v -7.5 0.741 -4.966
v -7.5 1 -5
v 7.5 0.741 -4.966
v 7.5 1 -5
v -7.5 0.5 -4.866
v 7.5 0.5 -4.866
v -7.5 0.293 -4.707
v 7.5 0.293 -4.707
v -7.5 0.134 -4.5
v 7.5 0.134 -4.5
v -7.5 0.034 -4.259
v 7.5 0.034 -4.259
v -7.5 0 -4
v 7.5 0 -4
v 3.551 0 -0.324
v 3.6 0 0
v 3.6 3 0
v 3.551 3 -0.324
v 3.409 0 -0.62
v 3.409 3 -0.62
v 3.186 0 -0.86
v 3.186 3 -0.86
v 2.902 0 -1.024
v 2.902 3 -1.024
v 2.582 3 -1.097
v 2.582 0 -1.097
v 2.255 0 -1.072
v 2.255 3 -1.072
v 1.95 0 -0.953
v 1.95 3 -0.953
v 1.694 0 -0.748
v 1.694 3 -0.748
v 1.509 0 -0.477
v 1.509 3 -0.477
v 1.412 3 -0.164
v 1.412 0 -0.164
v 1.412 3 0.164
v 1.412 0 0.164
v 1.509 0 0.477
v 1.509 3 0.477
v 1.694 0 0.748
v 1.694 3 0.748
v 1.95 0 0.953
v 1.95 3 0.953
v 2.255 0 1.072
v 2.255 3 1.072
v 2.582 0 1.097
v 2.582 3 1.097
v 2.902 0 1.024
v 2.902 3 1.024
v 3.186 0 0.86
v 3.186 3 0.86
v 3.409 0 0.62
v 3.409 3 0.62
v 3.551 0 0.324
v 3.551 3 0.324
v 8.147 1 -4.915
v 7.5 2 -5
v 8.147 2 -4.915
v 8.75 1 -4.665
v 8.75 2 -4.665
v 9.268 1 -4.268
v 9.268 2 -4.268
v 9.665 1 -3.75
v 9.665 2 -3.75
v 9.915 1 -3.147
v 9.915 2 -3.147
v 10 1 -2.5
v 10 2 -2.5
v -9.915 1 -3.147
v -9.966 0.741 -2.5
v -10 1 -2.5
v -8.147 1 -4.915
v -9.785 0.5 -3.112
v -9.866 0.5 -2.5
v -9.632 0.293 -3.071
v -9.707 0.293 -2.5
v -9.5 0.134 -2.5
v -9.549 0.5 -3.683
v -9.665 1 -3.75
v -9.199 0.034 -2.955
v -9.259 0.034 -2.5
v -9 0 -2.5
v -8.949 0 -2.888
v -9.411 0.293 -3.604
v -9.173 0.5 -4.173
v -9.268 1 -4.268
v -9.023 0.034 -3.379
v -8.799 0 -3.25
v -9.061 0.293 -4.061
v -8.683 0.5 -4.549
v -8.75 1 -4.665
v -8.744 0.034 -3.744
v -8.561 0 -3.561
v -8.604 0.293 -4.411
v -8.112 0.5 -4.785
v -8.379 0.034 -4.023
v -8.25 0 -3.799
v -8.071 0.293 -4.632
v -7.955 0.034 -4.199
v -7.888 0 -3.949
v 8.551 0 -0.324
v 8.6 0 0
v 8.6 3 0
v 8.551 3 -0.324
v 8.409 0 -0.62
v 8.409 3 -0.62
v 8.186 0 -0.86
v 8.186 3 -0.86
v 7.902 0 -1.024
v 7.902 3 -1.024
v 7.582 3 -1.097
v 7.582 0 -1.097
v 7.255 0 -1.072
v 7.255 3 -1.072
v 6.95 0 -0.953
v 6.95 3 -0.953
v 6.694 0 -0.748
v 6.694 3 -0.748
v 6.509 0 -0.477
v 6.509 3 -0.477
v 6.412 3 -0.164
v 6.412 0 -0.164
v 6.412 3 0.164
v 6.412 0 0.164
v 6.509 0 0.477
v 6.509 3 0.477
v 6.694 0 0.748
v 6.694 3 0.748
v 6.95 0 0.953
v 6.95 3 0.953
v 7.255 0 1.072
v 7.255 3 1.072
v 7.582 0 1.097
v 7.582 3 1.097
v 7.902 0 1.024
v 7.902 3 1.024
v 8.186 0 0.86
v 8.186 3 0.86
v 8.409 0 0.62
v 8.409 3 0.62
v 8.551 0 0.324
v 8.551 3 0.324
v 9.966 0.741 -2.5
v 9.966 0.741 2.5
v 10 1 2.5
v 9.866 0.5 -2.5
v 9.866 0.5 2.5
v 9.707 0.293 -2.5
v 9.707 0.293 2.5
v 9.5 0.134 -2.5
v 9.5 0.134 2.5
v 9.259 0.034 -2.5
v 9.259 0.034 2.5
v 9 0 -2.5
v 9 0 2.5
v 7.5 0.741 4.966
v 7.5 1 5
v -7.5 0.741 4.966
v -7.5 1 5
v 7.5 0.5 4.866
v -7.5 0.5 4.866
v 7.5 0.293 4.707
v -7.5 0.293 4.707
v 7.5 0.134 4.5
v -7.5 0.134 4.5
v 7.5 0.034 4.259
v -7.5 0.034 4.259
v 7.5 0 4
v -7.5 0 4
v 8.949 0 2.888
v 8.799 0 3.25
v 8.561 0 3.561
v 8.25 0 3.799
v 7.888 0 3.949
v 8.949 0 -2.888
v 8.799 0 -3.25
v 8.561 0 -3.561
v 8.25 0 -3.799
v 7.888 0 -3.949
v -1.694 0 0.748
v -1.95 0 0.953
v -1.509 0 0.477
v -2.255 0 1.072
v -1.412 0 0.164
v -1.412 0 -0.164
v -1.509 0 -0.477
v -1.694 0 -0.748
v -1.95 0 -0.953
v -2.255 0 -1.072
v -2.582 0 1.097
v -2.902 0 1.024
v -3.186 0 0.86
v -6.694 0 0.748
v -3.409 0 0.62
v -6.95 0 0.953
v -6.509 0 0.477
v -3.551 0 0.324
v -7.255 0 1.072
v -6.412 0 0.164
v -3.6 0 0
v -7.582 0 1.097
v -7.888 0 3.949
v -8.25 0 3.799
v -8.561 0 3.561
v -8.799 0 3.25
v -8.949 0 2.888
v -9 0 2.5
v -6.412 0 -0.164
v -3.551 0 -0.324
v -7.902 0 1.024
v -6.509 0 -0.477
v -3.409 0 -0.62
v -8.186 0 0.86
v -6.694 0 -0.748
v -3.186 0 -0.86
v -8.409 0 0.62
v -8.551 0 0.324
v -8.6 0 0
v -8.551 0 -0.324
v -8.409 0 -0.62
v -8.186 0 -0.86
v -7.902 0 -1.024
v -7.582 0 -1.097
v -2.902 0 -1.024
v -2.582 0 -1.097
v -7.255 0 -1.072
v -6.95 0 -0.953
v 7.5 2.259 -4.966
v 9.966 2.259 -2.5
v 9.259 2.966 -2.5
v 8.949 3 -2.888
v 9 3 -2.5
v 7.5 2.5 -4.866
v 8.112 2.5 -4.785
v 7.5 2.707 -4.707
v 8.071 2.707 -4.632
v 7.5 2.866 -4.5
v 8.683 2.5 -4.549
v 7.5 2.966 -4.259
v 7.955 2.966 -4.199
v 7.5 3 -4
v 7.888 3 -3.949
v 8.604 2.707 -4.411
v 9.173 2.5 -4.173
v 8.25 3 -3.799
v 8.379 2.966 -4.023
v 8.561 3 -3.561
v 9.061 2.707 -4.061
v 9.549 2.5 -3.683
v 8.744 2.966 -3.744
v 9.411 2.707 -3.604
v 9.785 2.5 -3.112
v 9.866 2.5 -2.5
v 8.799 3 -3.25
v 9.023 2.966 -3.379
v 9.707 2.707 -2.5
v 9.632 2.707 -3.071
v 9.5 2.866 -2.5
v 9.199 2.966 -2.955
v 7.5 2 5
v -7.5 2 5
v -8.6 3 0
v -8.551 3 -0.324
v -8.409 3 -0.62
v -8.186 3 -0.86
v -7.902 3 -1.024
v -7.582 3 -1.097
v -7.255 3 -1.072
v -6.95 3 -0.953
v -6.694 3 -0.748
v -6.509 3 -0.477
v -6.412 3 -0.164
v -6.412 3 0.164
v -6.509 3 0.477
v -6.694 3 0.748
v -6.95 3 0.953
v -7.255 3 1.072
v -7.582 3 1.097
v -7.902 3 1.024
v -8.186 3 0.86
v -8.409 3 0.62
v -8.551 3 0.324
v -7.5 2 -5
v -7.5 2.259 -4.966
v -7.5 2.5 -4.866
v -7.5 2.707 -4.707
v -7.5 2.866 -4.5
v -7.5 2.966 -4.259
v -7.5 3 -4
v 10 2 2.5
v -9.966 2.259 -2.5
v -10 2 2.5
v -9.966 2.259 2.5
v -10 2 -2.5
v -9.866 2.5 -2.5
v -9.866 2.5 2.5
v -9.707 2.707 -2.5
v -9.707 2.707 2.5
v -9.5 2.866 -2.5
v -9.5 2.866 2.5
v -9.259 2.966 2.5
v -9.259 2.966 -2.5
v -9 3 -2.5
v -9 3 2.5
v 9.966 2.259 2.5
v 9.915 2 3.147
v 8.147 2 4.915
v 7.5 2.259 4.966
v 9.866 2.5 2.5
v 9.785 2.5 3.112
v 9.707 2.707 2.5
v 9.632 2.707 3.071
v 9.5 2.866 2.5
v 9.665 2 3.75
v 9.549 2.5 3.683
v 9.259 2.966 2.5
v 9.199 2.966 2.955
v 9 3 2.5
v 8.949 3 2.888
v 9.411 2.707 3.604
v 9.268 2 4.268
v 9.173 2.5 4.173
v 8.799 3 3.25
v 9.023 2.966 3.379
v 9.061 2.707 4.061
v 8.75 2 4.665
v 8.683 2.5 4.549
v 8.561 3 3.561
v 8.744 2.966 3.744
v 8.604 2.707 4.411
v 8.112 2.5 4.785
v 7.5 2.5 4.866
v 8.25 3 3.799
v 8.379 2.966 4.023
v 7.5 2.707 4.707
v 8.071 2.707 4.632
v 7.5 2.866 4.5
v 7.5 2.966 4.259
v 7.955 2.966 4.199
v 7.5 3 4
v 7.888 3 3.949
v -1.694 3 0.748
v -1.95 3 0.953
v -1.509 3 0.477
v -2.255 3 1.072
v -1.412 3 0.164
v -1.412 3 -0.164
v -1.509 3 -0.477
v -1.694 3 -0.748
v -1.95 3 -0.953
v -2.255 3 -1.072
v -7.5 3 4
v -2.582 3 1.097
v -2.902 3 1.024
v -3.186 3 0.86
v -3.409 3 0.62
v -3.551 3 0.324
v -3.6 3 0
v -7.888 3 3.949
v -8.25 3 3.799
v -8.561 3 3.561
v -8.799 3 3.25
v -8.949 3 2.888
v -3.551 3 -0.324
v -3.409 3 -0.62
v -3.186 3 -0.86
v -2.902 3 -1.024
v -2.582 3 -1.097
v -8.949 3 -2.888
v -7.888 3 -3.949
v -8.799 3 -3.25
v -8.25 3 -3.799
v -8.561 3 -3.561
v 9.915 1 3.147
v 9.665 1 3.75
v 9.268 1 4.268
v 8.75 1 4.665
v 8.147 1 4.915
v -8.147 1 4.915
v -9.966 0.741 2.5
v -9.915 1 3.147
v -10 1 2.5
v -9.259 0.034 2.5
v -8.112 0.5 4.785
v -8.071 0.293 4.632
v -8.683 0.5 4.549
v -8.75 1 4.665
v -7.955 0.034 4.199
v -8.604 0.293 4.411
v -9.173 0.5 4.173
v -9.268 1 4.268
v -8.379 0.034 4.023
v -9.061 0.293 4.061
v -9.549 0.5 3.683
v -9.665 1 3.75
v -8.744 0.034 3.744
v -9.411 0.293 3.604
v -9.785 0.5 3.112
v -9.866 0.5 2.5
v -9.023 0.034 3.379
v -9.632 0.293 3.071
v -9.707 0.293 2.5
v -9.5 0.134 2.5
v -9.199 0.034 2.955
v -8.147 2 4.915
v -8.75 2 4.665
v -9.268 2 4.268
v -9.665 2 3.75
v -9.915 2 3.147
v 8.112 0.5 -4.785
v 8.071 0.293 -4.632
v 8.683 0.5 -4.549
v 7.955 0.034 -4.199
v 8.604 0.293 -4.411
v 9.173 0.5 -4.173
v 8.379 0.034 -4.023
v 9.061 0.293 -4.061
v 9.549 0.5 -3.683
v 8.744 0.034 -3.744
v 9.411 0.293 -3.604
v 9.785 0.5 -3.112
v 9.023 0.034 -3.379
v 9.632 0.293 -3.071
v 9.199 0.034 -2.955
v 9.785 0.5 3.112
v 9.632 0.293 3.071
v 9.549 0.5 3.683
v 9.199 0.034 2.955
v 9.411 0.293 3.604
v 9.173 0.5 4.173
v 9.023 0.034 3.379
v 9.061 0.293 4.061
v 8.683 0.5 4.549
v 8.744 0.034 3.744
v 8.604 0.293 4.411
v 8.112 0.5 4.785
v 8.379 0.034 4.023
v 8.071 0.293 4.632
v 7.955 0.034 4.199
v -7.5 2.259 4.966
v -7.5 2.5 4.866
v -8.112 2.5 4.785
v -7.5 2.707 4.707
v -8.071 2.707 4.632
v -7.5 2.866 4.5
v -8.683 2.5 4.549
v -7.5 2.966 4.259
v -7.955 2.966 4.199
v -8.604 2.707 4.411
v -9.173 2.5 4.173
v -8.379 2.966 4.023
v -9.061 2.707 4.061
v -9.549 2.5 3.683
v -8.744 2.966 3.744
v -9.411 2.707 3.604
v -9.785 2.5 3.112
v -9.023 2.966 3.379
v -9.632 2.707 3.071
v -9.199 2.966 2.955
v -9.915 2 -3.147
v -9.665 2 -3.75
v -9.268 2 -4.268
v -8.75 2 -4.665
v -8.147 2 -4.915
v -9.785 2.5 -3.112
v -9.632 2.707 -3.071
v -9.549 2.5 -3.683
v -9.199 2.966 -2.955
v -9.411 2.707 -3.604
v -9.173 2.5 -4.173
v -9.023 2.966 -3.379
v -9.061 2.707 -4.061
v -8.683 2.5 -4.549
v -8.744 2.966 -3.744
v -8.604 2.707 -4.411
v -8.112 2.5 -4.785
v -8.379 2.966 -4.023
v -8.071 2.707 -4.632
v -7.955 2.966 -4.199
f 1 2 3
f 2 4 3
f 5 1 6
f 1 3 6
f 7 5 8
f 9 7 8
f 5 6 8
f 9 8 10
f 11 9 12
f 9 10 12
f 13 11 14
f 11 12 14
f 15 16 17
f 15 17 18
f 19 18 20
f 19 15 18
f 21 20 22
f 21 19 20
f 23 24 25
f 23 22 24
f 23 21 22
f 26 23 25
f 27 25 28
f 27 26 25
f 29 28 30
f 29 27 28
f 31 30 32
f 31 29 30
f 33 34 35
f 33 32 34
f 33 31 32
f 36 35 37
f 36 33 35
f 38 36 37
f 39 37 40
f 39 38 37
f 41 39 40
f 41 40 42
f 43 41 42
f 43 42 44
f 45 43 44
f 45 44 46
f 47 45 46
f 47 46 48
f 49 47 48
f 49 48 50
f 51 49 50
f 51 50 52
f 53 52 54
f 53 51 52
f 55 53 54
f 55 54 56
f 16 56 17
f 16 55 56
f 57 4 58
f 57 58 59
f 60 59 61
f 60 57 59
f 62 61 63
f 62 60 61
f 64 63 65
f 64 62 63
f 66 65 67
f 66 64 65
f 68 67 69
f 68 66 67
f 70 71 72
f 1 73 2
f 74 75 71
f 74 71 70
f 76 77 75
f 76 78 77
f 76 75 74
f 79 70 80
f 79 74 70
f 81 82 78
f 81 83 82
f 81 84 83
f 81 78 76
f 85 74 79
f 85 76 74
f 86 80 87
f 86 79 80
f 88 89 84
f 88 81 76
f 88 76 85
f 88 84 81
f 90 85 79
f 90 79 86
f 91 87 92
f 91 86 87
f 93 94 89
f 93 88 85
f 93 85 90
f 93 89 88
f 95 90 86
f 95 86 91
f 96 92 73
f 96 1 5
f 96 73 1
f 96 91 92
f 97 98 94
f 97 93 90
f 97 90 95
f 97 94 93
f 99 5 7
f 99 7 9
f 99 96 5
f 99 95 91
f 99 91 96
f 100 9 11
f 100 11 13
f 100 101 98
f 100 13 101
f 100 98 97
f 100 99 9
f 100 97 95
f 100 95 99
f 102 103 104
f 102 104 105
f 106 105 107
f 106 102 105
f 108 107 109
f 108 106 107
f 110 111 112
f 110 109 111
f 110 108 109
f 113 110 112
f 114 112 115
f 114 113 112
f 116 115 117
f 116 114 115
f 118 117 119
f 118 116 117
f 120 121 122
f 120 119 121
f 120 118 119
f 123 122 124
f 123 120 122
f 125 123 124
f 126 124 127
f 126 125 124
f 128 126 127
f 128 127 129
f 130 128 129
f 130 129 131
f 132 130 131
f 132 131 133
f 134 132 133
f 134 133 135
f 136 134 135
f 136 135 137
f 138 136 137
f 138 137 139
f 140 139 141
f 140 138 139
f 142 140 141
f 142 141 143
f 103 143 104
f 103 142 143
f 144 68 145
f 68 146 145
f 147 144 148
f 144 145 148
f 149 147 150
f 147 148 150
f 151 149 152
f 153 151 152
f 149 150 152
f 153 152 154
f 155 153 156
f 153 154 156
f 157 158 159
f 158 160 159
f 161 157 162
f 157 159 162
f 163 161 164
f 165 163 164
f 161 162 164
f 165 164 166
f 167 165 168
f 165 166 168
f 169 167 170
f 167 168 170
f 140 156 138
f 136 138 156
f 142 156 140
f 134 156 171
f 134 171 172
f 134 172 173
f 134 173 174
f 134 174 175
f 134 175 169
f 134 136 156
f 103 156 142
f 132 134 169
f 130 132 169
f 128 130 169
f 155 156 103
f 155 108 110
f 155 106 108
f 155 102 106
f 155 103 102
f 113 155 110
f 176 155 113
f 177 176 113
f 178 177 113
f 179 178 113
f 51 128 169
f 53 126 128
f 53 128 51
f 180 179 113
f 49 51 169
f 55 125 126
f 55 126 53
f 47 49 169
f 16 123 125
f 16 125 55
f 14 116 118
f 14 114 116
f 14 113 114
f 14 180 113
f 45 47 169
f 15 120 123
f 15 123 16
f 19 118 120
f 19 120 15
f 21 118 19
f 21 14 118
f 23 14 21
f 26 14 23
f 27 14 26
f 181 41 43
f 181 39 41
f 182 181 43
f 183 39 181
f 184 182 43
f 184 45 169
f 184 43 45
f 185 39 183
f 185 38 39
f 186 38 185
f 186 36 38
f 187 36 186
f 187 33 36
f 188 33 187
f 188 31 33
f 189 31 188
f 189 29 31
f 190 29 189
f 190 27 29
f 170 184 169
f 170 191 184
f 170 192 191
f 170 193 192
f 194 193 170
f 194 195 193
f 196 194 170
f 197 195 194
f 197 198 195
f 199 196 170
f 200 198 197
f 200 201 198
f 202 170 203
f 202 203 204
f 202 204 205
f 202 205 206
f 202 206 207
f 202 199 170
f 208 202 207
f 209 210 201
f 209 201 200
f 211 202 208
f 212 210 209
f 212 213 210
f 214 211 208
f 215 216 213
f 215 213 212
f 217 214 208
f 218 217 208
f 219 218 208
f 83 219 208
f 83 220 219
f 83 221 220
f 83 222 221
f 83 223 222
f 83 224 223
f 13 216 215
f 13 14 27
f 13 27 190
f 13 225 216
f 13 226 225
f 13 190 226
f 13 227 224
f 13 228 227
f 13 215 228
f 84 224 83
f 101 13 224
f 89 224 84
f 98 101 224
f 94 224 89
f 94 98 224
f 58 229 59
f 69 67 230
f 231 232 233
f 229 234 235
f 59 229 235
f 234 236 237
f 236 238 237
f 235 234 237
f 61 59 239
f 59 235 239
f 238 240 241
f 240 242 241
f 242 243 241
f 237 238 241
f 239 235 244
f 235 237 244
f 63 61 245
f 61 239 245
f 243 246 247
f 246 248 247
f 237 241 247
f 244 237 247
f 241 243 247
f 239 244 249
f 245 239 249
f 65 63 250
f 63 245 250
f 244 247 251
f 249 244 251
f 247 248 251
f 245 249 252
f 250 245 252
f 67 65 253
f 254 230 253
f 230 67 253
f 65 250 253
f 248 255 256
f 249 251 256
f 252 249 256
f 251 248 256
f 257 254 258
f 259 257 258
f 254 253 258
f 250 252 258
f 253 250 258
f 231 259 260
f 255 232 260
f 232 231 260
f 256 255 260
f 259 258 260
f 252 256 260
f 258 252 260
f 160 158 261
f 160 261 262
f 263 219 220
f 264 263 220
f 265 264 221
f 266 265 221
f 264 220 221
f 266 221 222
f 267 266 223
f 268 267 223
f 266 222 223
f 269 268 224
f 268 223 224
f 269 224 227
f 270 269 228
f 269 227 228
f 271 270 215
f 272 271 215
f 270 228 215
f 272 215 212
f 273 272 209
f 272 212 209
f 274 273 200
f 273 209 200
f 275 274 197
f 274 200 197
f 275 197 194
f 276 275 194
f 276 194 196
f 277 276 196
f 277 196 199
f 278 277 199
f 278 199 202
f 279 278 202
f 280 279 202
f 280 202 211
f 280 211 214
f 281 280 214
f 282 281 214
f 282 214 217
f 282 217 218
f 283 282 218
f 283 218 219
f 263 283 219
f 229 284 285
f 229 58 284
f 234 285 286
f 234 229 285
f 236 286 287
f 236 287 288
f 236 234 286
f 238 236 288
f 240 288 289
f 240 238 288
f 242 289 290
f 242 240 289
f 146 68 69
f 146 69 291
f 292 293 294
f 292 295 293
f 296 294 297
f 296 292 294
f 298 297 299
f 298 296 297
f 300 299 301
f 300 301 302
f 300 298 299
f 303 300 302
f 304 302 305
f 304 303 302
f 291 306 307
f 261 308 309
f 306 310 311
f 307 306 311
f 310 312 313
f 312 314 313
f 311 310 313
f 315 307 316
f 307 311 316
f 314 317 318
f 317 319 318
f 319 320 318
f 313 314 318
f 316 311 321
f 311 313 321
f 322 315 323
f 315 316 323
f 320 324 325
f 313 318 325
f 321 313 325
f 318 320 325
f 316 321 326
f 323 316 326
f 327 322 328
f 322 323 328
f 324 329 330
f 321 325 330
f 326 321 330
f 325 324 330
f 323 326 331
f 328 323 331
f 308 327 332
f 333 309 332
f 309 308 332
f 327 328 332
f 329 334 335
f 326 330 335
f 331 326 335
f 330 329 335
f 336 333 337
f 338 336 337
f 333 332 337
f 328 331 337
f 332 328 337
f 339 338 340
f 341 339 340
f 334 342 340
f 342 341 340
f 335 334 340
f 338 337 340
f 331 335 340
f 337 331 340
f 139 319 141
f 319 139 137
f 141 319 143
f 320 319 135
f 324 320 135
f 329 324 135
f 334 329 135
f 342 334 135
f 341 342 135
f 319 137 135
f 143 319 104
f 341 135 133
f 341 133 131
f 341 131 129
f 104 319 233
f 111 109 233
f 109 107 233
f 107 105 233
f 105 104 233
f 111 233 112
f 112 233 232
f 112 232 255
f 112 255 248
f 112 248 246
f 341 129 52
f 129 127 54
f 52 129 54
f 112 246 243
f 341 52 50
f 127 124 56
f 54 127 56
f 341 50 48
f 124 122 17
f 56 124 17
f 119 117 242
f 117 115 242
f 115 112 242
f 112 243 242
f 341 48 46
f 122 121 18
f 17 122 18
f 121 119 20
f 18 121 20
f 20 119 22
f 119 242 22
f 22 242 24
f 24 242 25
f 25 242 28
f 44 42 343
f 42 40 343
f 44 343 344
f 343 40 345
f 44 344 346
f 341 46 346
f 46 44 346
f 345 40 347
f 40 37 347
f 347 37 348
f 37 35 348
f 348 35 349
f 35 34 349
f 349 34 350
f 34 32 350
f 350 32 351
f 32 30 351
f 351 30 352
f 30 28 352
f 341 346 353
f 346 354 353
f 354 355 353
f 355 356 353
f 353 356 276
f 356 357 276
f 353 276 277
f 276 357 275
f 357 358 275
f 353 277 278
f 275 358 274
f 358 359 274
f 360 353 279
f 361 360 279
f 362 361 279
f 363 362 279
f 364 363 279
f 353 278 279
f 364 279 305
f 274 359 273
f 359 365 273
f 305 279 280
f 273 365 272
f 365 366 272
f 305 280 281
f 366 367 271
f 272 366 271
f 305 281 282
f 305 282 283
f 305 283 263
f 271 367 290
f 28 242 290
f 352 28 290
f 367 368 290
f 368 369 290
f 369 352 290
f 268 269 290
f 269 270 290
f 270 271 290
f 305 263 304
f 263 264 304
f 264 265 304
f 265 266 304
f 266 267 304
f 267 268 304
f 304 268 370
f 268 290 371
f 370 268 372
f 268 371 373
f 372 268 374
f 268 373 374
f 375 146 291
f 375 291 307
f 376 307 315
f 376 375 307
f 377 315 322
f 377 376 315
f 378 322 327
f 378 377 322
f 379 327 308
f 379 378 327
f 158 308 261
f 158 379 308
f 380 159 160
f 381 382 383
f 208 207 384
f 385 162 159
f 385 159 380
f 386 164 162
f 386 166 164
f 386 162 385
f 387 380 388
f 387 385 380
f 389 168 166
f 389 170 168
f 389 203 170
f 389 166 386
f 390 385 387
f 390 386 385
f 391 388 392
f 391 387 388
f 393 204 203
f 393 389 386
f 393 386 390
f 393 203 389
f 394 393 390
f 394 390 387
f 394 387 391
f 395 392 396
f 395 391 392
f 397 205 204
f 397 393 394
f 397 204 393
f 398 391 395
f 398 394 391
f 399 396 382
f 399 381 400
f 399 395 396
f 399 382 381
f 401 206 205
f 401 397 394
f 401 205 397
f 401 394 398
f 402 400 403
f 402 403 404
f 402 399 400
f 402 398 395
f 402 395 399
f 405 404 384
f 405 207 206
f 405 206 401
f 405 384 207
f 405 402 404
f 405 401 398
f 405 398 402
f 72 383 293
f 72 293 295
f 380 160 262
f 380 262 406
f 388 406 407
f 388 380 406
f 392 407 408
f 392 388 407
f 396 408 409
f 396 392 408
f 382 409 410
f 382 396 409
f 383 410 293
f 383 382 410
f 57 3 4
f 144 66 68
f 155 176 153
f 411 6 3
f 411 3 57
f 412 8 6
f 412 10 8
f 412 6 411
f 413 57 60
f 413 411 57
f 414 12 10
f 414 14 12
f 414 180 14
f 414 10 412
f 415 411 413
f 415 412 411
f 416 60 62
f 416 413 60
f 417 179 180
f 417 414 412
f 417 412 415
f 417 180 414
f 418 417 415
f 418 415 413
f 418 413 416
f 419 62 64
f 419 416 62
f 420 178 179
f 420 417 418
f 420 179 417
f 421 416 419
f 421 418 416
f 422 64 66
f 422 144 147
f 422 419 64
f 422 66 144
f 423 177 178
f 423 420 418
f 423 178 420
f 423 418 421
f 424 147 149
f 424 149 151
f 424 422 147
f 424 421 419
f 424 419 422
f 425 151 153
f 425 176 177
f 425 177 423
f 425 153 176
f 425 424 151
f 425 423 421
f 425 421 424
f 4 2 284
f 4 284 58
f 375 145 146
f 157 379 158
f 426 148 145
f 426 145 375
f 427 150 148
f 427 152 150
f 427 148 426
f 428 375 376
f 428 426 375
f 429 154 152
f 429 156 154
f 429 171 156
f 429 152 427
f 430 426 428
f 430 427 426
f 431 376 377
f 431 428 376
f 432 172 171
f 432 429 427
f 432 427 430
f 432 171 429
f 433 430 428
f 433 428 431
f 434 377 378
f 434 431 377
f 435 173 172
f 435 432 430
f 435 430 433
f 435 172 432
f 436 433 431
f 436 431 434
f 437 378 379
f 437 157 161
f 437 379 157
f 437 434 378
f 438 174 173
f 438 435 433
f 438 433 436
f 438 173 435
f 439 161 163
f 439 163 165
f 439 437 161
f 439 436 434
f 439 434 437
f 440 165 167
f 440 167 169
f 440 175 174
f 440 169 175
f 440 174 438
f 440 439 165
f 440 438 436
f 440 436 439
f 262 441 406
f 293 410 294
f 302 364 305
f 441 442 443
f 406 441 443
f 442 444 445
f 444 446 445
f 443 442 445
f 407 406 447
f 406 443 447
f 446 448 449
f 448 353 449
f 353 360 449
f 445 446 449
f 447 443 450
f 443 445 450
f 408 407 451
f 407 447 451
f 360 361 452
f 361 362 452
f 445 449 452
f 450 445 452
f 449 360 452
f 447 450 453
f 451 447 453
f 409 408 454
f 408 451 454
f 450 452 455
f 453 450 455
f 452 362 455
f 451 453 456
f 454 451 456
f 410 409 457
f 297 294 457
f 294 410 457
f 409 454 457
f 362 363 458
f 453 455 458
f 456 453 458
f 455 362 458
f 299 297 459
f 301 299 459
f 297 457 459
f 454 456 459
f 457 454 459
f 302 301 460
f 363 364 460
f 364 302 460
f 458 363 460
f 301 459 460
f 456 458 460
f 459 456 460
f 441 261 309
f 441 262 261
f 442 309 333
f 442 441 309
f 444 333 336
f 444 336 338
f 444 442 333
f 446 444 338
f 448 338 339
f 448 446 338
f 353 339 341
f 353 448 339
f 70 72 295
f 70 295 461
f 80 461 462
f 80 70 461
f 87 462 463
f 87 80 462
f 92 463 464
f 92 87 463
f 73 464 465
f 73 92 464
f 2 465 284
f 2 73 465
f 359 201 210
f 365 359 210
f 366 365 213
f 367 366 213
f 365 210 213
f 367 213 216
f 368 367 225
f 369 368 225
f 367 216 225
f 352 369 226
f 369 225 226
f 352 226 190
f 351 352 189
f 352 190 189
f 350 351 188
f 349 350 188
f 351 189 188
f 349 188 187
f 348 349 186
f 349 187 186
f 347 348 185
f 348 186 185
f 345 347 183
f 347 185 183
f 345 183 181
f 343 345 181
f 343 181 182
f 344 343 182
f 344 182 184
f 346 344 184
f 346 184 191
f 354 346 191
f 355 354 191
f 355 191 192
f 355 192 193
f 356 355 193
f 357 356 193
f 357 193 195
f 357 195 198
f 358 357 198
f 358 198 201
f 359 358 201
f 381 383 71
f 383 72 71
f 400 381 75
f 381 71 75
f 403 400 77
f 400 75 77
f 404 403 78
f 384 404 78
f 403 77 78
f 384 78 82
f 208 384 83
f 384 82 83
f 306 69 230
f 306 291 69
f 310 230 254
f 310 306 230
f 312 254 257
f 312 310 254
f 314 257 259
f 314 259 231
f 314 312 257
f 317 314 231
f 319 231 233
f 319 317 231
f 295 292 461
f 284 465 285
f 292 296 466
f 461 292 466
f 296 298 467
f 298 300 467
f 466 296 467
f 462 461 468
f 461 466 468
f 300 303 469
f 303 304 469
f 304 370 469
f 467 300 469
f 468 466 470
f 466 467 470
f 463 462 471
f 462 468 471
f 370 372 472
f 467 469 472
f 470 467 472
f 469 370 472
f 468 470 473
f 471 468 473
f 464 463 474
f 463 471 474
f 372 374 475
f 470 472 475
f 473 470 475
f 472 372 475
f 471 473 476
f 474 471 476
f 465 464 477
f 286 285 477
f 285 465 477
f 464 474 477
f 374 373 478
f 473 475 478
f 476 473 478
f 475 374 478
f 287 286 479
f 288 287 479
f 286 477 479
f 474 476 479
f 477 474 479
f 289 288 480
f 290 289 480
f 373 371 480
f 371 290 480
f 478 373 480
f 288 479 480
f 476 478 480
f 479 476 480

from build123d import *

# Parameters (mm, degrees)
EXTRUDE_1_DEPTH            = 3
F_2_2_2_2_DIAMETER_HOLE1_D = 2.2
FILLET_1_R                 = 1


with BuildPart() as part:
    # 草图1 → 凸台-拉伸1 (new body)
    with BuildSketch(Plane(origin=(0, 0, 0), x_dir=(1, 0, 0), z_dir=(0, 1, 0))):
        with BuildLine():
            Line((-7.5, 5), (7.5, 5))
            ThreePointArc((7.5, 5), (9.267766953, 4.267766953), (10, 2.5))
            Line((10, 2.5), (10, -2.5))
            ThreePointArc((10, -2.5), (9.267766953, -4.267766953), (7.5, -5))
            Line((7.5, -5), (-7.5, -5))
            ThreePointArc((-7.5, -5), (-9.267766953, -4.267766953), (-10, -2.5))
            Line((-10, -2.5), (-10, 2.5))
            ThreePointArc((-10, 2.5), (-9.267766953, 4.267766953), (-7.5, 5))
        make_face()
    extrude(amount=EXTRUDE_1_DEPTH)

    # Ø2.2 (2.2) Diameter Hole1 (through all)
    with Locations(Plane(origin=(0, 3, 0), x_dir=(1, 0, 0), z_dir=(0, 1, 0))):
        with Locations((-7.5, 0), (-2.5, 0)):
            f_2_2_2_2_diameter_hole1 = Hole(F_2_2_2_2_DIAMETER_HOLE1_D / 2)

    # 镜向1: Ø2.2 (2.2) Diameter Hole1 across plane
    add(f_2_2_2_2_diameter_hole1.mirror(Plane(origin=(0, 0, 0), x_dir=(0, 0, 1), z_dir=(1, 0, 0))), mode=Mode.SUBTRACT)

    # 圆角1
    fillet_1_edges = [part.edges().sort_by_distance(p)[0] for p in [
        (0, 0, -5),
        (9.267766953, 0, -4.267766953),
        (10, 0, 0),
        (9.267766953, 0, 4.267766953),
        (9.267766953, 3, -4.267766953),
        (0, 3, -5),
        (-9.267766953, 3, -4.267766953),
        (-10, 3, 0),
        (-9.267766953, 3, 4.267766953),
        (0, 3, 5),
        (9.267766953, 3, 4.267766953),
        (0, 0, 5),
        (10, 3, 0),
        (-9.267766953, 0, 4.267766953),
        (-10, 0, 0),
        (-9.267766953, 0, -4.267766953),
    ]]
    fillet(fillet_1_edges, radius=FILLET_1_R)


solid = part.part
